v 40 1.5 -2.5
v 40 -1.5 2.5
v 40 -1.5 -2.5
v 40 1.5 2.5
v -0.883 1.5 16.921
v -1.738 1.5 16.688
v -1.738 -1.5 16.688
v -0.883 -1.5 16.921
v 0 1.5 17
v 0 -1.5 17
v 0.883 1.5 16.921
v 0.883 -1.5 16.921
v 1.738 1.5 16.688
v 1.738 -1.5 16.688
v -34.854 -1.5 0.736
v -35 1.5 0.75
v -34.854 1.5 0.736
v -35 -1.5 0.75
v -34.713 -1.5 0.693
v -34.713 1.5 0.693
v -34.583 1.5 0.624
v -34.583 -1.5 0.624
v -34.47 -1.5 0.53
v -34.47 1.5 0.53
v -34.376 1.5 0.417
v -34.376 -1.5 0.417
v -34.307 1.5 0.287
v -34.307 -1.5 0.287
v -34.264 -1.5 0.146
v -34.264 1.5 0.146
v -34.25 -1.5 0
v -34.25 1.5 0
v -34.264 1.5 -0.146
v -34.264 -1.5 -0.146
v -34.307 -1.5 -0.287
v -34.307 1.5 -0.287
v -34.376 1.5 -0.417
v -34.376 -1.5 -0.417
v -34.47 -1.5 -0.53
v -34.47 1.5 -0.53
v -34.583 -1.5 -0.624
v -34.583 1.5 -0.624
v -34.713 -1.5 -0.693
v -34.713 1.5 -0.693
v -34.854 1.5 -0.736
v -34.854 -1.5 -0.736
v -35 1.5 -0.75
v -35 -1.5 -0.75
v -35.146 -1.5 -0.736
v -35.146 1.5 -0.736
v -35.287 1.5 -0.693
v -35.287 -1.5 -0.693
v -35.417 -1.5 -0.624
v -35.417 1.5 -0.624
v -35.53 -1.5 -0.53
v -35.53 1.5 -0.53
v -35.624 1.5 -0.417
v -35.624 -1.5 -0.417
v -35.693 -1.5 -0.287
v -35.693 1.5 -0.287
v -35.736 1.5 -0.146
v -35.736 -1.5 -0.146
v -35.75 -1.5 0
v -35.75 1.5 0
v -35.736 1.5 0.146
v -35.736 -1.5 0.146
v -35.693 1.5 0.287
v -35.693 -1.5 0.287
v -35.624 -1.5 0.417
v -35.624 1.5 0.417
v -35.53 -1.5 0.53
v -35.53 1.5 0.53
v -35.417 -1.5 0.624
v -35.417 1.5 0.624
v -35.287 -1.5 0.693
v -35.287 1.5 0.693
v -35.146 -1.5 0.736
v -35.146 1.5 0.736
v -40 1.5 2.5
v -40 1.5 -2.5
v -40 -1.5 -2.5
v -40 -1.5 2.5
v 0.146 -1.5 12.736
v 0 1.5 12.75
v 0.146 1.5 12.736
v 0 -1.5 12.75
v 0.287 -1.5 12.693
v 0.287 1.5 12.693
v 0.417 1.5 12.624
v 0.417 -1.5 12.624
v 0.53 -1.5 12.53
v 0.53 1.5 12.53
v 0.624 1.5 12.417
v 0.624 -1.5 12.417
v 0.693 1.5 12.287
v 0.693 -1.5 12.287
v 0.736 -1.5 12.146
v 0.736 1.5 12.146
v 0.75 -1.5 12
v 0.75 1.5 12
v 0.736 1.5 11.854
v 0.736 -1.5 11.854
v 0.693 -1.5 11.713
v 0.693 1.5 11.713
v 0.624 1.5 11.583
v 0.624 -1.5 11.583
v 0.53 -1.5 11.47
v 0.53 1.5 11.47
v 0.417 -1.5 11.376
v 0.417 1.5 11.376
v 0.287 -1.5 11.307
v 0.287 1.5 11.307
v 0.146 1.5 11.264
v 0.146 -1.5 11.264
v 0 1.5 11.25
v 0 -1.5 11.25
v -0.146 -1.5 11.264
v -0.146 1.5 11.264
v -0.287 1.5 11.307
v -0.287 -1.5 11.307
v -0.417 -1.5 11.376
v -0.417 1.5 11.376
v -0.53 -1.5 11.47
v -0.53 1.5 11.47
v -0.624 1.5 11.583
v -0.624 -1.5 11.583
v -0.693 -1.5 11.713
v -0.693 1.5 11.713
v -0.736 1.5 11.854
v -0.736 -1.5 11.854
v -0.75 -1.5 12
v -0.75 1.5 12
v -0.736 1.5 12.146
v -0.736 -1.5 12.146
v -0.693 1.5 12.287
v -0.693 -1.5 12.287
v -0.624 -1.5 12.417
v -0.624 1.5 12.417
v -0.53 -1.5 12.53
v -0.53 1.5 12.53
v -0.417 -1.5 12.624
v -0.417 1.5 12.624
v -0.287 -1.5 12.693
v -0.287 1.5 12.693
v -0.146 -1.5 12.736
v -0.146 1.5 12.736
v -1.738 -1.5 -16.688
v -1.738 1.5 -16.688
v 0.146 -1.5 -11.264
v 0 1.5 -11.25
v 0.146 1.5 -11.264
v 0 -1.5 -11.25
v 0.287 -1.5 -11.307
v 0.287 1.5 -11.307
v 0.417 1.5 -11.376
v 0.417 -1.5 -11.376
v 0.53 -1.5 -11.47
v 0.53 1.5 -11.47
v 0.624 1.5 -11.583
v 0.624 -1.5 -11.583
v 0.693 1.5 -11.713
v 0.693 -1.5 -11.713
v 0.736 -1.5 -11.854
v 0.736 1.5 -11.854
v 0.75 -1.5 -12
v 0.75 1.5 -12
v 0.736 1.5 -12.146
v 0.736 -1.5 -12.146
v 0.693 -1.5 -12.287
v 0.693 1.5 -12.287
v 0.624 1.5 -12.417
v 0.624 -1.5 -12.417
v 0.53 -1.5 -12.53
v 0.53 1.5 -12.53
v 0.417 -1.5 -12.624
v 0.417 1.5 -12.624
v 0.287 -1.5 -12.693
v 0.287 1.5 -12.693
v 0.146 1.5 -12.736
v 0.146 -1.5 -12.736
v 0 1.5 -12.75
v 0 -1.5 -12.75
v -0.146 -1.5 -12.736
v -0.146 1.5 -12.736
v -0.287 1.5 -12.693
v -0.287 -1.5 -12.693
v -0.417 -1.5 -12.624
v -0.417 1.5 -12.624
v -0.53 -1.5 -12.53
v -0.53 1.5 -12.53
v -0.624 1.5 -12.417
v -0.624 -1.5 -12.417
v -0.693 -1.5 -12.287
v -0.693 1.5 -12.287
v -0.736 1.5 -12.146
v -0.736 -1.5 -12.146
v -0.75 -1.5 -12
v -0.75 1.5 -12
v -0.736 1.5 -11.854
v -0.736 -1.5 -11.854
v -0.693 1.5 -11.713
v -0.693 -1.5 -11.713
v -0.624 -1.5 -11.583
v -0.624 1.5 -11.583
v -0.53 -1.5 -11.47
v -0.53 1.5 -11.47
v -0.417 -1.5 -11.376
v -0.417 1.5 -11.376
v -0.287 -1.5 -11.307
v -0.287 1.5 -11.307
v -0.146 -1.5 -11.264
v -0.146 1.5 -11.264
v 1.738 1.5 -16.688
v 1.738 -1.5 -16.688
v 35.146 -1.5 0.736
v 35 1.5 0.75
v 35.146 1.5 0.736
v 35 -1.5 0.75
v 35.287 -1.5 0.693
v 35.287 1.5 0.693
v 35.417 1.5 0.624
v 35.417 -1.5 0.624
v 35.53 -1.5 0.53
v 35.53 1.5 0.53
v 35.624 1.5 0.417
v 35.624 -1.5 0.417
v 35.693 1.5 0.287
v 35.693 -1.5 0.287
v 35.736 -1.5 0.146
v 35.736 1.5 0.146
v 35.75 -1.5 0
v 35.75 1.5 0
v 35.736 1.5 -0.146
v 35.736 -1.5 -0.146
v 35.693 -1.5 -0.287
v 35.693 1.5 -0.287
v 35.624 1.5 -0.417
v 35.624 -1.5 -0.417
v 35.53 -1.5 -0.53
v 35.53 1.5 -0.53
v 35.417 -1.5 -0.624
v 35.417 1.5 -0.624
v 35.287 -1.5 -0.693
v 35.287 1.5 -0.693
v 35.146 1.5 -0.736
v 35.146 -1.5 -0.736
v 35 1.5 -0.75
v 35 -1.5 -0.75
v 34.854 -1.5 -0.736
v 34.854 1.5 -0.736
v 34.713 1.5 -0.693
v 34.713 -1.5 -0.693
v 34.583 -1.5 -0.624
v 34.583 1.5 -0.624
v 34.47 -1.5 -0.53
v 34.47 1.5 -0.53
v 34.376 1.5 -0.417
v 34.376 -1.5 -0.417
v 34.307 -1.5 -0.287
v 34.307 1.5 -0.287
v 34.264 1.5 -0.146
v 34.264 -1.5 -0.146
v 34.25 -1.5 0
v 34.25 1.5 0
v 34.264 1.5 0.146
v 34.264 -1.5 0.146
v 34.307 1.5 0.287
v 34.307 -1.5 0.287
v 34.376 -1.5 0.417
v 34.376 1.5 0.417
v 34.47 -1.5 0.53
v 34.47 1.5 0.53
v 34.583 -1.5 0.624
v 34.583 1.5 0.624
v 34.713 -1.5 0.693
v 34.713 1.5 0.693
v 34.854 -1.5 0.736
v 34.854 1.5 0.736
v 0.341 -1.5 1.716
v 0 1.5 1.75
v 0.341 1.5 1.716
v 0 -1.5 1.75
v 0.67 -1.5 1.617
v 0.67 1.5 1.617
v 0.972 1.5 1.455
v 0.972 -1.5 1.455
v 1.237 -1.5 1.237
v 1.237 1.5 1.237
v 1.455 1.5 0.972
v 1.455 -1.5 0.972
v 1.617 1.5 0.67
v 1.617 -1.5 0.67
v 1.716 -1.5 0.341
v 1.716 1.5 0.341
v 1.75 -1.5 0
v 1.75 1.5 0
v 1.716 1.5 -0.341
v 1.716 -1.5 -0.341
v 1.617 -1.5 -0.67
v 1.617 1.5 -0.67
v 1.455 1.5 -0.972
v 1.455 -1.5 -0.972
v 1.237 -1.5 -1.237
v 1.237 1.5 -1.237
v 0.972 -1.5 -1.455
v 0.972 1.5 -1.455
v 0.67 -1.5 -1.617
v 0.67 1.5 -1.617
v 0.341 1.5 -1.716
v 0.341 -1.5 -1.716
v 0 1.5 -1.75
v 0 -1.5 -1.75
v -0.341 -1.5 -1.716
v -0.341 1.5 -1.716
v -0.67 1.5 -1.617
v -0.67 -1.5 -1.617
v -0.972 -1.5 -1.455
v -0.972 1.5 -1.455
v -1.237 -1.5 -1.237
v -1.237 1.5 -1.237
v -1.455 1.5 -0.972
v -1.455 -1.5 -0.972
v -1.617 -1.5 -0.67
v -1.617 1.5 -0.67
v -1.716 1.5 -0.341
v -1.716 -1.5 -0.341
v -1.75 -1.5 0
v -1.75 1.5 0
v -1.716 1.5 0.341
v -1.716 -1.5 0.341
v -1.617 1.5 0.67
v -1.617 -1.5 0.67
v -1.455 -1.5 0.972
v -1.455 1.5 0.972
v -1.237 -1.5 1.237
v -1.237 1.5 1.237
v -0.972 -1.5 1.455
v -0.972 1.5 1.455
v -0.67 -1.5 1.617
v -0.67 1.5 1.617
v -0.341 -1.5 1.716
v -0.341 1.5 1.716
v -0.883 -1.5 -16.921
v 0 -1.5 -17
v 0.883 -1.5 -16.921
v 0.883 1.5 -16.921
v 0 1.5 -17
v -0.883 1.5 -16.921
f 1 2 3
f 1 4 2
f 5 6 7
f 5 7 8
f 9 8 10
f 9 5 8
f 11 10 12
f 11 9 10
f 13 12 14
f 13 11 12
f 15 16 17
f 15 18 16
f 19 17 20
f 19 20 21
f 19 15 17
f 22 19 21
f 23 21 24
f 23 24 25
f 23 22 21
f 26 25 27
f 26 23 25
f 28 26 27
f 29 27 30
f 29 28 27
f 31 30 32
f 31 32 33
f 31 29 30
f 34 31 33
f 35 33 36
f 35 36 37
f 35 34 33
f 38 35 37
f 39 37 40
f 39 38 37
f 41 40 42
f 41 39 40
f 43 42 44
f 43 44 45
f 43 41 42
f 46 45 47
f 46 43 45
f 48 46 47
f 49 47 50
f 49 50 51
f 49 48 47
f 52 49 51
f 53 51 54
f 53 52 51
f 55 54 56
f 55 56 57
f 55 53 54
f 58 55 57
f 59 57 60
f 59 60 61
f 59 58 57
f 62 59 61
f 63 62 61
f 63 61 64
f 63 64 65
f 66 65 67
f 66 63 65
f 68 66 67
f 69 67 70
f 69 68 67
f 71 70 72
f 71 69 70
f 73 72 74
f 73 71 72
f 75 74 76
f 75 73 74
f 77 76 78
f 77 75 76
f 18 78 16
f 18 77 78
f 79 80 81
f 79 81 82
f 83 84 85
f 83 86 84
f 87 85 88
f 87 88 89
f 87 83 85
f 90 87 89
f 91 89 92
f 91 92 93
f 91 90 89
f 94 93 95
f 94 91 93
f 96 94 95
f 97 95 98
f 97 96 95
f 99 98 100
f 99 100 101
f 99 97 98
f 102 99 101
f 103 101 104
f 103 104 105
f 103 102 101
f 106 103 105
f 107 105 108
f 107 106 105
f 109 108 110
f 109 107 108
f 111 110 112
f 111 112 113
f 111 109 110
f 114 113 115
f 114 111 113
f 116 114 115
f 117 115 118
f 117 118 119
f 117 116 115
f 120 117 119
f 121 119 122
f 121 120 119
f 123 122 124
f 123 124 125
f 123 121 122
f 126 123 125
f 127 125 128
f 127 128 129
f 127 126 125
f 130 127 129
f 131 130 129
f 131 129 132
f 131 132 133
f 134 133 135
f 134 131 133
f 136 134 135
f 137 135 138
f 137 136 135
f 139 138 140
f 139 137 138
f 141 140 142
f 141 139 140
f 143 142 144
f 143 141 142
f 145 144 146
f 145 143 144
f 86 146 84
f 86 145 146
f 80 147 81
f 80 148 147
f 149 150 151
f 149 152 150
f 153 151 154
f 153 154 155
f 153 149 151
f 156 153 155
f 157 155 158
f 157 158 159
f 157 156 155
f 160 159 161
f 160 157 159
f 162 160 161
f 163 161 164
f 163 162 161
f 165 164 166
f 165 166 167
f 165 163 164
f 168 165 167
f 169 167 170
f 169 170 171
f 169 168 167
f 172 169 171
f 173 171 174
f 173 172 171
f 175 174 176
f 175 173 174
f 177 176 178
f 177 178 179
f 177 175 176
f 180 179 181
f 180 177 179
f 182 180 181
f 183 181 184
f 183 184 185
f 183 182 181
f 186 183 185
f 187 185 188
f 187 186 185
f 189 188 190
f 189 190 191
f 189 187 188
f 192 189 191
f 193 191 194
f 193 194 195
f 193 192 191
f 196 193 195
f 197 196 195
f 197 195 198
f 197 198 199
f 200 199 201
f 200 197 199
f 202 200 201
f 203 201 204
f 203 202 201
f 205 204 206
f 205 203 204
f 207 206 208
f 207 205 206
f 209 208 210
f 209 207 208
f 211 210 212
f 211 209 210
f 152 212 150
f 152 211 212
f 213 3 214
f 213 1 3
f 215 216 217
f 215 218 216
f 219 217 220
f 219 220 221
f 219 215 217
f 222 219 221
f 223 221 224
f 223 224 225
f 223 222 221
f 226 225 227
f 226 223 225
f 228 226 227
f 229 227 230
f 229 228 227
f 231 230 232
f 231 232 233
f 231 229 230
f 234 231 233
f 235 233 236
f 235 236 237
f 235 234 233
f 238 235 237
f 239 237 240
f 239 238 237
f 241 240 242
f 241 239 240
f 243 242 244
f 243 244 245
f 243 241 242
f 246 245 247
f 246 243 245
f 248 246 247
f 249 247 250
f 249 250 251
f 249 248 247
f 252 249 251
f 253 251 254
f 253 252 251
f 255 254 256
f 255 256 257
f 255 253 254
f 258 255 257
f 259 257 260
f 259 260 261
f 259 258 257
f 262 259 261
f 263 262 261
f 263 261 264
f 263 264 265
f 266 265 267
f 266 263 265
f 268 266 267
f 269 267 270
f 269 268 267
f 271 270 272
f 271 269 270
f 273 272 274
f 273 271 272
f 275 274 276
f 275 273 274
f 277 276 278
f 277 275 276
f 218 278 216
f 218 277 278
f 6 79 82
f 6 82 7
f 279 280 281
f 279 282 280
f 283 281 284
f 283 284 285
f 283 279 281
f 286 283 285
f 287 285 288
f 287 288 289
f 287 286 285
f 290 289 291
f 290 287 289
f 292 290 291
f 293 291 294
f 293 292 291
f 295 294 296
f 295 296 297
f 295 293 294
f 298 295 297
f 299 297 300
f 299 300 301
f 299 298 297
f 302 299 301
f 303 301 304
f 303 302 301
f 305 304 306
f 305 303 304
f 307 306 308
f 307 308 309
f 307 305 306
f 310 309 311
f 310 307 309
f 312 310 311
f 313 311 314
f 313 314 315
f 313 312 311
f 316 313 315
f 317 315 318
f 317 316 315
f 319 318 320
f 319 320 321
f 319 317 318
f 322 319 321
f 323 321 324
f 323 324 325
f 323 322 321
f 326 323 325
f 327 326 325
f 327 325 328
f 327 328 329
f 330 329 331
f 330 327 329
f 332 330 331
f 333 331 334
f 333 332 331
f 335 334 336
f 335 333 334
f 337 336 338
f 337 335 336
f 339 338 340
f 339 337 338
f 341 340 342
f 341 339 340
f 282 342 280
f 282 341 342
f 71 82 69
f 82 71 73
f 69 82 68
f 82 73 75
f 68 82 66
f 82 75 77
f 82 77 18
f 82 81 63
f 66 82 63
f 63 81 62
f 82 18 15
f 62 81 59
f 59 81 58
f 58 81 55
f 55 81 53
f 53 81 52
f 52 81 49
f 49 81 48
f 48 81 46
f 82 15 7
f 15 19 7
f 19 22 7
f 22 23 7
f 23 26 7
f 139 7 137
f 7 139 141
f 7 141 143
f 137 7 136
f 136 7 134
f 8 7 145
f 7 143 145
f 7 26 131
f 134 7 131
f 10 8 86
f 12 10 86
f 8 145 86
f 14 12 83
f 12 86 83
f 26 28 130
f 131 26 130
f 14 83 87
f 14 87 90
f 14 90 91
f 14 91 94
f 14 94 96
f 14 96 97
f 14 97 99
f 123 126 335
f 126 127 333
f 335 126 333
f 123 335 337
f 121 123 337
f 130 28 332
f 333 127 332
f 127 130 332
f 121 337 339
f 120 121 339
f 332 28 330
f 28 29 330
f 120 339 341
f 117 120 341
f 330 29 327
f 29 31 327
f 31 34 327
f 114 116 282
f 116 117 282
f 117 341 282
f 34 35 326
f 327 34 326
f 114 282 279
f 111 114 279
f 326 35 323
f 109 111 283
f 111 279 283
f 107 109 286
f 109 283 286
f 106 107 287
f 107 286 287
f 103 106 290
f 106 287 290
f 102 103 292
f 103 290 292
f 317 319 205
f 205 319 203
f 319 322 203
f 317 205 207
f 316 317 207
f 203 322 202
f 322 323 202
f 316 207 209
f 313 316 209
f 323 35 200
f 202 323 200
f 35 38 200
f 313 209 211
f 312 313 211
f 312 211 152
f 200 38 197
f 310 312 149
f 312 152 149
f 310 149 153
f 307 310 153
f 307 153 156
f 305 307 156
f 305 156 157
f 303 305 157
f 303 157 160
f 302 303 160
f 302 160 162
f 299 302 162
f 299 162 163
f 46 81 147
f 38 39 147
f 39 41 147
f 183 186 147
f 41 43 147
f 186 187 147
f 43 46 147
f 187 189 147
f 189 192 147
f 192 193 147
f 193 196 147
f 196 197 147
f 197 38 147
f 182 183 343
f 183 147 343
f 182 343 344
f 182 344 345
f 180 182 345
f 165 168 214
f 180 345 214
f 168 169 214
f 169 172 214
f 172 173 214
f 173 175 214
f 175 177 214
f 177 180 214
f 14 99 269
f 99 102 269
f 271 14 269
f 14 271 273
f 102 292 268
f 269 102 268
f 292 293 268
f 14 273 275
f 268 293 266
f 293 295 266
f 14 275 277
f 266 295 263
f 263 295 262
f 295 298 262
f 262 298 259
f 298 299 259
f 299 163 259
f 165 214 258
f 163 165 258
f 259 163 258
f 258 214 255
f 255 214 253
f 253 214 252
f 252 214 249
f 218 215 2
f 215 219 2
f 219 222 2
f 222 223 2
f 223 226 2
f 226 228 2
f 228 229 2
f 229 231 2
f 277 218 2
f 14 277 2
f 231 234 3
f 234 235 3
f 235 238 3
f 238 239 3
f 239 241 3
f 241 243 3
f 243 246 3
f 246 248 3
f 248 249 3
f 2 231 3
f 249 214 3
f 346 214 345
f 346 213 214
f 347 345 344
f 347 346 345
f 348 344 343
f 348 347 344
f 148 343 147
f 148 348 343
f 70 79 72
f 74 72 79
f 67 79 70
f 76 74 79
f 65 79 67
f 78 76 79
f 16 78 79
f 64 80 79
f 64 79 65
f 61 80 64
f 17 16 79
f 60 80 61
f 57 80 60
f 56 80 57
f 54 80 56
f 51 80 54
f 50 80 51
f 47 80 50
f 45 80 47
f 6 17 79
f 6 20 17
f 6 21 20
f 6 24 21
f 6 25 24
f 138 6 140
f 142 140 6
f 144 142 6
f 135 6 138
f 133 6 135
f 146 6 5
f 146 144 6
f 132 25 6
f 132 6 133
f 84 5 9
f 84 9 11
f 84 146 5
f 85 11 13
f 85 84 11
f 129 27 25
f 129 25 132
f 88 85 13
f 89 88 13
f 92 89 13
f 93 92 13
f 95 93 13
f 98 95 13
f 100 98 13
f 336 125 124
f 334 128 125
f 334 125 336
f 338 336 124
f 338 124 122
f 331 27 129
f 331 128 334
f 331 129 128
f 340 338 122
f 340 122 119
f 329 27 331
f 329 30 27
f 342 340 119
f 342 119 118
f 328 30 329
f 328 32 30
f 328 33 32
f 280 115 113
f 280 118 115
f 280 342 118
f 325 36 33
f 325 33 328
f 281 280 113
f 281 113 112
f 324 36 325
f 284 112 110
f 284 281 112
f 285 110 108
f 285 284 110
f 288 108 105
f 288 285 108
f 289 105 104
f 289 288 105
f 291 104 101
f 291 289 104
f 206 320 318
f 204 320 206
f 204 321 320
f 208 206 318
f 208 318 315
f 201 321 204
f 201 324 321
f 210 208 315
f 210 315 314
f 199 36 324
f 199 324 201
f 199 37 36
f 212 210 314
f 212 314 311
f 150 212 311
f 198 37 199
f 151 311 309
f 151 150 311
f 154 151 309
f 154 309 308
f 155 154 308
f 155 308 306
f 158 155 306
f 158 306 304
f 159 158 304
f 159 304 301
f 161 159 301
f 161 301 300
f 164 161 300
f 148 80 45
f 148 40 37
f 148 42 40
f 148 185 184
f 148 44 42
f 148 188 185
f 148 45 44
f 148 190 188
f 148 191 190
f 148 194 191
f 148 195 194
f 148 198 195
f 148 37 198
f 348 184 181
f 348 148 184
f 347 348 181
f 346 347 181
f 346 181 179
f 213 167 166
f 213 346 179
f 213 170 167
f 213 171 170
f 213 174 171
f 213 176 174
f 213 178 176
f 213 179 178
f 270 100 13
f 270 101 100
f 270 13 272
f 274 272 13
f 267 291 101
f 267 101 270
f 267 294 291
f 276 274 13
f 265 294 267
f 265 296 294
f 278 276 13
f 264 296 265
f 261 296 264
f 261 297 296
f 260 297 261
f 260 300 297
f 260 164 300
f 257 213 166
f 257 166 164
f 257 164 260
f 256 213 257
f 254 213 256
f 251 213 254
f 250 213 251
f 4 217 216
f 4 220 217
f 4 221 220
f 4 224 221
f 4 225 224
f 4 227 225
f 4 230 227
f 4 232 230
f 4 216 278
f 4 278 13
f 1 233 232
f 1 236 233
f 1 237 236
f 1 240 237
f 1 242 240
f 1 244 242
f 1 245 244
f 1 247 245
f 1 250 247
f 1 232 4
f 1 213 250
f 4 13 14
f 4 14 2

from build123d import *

# Parameters (mm, degrees)
SKETCH1_R      = 0.75
SKETCH1_R_2    = 1.75
EXTRUDE1_DEPTH = 1.5


with BuildPart() as part:
    # Sketch1 → Extrude1 (new body, symmetric)
    with BuildSketch(Plane(origin=(0, 0, 0), x_dir=(1, 0, 0), z_dir=(0, 1, 0))):
        with BuildLine():
            Line((-1.738414467, 16.688060915), (-40, 2.5))
            Line((-40, 2.5), (-40, -2.5))
            Line((-40, -2.5), (-1.738414467, -16.688060915))
            ThreePointArc((-1.738414467, -16.688060915), (0, -17), (1.738414467, -16.688060915))
            Line((1.738414467, -16.688060915), (40, -2.5))
            Line((40, -2.5), (40, 2.5))
            Line((40, 2.5), (1.738414467, 16.688060915))
            ThreePointArc((1.738414467, 16.688060915), (0, 17), (-1.738414467, 16.688060915))
        make_face()
        with Locations(Location((0, 12, 0), (0, 0, 270))):  # turned: the seam where the file's is
            Circle(SKETCH1_R, mode=Mode.SUBTRACT)
        with Locations(Location((0, -12, 0), (0, 0, 270))):  # turned: the seam where the file's is
            Circle(SKETCH1_R, mode=Mode.SUBTRACT)
        with Locations(Location((35, 0, 0), (0, 0, 270))):  # turned: the seam where the file's is
            Circle(SKETCH1_R, mode=Mode.SUBTRACT)
        with Locations(Location((-35, 0, 0), (0, 0, 270))):  # turned: the seam where the file's is
            Circle(SKETCH1_R, mode=Mode.SUBTRACT)
        with Locations(Location((0, 0, 0), (0, 0, 270))):  # turned: the seam where the file's is
            Circle(SKETCH1_R_2, mode=Mode.SUBTRACT)
    extrude(amount=EXTRUDE1_DEPTH, both=True)


solid = part.part
